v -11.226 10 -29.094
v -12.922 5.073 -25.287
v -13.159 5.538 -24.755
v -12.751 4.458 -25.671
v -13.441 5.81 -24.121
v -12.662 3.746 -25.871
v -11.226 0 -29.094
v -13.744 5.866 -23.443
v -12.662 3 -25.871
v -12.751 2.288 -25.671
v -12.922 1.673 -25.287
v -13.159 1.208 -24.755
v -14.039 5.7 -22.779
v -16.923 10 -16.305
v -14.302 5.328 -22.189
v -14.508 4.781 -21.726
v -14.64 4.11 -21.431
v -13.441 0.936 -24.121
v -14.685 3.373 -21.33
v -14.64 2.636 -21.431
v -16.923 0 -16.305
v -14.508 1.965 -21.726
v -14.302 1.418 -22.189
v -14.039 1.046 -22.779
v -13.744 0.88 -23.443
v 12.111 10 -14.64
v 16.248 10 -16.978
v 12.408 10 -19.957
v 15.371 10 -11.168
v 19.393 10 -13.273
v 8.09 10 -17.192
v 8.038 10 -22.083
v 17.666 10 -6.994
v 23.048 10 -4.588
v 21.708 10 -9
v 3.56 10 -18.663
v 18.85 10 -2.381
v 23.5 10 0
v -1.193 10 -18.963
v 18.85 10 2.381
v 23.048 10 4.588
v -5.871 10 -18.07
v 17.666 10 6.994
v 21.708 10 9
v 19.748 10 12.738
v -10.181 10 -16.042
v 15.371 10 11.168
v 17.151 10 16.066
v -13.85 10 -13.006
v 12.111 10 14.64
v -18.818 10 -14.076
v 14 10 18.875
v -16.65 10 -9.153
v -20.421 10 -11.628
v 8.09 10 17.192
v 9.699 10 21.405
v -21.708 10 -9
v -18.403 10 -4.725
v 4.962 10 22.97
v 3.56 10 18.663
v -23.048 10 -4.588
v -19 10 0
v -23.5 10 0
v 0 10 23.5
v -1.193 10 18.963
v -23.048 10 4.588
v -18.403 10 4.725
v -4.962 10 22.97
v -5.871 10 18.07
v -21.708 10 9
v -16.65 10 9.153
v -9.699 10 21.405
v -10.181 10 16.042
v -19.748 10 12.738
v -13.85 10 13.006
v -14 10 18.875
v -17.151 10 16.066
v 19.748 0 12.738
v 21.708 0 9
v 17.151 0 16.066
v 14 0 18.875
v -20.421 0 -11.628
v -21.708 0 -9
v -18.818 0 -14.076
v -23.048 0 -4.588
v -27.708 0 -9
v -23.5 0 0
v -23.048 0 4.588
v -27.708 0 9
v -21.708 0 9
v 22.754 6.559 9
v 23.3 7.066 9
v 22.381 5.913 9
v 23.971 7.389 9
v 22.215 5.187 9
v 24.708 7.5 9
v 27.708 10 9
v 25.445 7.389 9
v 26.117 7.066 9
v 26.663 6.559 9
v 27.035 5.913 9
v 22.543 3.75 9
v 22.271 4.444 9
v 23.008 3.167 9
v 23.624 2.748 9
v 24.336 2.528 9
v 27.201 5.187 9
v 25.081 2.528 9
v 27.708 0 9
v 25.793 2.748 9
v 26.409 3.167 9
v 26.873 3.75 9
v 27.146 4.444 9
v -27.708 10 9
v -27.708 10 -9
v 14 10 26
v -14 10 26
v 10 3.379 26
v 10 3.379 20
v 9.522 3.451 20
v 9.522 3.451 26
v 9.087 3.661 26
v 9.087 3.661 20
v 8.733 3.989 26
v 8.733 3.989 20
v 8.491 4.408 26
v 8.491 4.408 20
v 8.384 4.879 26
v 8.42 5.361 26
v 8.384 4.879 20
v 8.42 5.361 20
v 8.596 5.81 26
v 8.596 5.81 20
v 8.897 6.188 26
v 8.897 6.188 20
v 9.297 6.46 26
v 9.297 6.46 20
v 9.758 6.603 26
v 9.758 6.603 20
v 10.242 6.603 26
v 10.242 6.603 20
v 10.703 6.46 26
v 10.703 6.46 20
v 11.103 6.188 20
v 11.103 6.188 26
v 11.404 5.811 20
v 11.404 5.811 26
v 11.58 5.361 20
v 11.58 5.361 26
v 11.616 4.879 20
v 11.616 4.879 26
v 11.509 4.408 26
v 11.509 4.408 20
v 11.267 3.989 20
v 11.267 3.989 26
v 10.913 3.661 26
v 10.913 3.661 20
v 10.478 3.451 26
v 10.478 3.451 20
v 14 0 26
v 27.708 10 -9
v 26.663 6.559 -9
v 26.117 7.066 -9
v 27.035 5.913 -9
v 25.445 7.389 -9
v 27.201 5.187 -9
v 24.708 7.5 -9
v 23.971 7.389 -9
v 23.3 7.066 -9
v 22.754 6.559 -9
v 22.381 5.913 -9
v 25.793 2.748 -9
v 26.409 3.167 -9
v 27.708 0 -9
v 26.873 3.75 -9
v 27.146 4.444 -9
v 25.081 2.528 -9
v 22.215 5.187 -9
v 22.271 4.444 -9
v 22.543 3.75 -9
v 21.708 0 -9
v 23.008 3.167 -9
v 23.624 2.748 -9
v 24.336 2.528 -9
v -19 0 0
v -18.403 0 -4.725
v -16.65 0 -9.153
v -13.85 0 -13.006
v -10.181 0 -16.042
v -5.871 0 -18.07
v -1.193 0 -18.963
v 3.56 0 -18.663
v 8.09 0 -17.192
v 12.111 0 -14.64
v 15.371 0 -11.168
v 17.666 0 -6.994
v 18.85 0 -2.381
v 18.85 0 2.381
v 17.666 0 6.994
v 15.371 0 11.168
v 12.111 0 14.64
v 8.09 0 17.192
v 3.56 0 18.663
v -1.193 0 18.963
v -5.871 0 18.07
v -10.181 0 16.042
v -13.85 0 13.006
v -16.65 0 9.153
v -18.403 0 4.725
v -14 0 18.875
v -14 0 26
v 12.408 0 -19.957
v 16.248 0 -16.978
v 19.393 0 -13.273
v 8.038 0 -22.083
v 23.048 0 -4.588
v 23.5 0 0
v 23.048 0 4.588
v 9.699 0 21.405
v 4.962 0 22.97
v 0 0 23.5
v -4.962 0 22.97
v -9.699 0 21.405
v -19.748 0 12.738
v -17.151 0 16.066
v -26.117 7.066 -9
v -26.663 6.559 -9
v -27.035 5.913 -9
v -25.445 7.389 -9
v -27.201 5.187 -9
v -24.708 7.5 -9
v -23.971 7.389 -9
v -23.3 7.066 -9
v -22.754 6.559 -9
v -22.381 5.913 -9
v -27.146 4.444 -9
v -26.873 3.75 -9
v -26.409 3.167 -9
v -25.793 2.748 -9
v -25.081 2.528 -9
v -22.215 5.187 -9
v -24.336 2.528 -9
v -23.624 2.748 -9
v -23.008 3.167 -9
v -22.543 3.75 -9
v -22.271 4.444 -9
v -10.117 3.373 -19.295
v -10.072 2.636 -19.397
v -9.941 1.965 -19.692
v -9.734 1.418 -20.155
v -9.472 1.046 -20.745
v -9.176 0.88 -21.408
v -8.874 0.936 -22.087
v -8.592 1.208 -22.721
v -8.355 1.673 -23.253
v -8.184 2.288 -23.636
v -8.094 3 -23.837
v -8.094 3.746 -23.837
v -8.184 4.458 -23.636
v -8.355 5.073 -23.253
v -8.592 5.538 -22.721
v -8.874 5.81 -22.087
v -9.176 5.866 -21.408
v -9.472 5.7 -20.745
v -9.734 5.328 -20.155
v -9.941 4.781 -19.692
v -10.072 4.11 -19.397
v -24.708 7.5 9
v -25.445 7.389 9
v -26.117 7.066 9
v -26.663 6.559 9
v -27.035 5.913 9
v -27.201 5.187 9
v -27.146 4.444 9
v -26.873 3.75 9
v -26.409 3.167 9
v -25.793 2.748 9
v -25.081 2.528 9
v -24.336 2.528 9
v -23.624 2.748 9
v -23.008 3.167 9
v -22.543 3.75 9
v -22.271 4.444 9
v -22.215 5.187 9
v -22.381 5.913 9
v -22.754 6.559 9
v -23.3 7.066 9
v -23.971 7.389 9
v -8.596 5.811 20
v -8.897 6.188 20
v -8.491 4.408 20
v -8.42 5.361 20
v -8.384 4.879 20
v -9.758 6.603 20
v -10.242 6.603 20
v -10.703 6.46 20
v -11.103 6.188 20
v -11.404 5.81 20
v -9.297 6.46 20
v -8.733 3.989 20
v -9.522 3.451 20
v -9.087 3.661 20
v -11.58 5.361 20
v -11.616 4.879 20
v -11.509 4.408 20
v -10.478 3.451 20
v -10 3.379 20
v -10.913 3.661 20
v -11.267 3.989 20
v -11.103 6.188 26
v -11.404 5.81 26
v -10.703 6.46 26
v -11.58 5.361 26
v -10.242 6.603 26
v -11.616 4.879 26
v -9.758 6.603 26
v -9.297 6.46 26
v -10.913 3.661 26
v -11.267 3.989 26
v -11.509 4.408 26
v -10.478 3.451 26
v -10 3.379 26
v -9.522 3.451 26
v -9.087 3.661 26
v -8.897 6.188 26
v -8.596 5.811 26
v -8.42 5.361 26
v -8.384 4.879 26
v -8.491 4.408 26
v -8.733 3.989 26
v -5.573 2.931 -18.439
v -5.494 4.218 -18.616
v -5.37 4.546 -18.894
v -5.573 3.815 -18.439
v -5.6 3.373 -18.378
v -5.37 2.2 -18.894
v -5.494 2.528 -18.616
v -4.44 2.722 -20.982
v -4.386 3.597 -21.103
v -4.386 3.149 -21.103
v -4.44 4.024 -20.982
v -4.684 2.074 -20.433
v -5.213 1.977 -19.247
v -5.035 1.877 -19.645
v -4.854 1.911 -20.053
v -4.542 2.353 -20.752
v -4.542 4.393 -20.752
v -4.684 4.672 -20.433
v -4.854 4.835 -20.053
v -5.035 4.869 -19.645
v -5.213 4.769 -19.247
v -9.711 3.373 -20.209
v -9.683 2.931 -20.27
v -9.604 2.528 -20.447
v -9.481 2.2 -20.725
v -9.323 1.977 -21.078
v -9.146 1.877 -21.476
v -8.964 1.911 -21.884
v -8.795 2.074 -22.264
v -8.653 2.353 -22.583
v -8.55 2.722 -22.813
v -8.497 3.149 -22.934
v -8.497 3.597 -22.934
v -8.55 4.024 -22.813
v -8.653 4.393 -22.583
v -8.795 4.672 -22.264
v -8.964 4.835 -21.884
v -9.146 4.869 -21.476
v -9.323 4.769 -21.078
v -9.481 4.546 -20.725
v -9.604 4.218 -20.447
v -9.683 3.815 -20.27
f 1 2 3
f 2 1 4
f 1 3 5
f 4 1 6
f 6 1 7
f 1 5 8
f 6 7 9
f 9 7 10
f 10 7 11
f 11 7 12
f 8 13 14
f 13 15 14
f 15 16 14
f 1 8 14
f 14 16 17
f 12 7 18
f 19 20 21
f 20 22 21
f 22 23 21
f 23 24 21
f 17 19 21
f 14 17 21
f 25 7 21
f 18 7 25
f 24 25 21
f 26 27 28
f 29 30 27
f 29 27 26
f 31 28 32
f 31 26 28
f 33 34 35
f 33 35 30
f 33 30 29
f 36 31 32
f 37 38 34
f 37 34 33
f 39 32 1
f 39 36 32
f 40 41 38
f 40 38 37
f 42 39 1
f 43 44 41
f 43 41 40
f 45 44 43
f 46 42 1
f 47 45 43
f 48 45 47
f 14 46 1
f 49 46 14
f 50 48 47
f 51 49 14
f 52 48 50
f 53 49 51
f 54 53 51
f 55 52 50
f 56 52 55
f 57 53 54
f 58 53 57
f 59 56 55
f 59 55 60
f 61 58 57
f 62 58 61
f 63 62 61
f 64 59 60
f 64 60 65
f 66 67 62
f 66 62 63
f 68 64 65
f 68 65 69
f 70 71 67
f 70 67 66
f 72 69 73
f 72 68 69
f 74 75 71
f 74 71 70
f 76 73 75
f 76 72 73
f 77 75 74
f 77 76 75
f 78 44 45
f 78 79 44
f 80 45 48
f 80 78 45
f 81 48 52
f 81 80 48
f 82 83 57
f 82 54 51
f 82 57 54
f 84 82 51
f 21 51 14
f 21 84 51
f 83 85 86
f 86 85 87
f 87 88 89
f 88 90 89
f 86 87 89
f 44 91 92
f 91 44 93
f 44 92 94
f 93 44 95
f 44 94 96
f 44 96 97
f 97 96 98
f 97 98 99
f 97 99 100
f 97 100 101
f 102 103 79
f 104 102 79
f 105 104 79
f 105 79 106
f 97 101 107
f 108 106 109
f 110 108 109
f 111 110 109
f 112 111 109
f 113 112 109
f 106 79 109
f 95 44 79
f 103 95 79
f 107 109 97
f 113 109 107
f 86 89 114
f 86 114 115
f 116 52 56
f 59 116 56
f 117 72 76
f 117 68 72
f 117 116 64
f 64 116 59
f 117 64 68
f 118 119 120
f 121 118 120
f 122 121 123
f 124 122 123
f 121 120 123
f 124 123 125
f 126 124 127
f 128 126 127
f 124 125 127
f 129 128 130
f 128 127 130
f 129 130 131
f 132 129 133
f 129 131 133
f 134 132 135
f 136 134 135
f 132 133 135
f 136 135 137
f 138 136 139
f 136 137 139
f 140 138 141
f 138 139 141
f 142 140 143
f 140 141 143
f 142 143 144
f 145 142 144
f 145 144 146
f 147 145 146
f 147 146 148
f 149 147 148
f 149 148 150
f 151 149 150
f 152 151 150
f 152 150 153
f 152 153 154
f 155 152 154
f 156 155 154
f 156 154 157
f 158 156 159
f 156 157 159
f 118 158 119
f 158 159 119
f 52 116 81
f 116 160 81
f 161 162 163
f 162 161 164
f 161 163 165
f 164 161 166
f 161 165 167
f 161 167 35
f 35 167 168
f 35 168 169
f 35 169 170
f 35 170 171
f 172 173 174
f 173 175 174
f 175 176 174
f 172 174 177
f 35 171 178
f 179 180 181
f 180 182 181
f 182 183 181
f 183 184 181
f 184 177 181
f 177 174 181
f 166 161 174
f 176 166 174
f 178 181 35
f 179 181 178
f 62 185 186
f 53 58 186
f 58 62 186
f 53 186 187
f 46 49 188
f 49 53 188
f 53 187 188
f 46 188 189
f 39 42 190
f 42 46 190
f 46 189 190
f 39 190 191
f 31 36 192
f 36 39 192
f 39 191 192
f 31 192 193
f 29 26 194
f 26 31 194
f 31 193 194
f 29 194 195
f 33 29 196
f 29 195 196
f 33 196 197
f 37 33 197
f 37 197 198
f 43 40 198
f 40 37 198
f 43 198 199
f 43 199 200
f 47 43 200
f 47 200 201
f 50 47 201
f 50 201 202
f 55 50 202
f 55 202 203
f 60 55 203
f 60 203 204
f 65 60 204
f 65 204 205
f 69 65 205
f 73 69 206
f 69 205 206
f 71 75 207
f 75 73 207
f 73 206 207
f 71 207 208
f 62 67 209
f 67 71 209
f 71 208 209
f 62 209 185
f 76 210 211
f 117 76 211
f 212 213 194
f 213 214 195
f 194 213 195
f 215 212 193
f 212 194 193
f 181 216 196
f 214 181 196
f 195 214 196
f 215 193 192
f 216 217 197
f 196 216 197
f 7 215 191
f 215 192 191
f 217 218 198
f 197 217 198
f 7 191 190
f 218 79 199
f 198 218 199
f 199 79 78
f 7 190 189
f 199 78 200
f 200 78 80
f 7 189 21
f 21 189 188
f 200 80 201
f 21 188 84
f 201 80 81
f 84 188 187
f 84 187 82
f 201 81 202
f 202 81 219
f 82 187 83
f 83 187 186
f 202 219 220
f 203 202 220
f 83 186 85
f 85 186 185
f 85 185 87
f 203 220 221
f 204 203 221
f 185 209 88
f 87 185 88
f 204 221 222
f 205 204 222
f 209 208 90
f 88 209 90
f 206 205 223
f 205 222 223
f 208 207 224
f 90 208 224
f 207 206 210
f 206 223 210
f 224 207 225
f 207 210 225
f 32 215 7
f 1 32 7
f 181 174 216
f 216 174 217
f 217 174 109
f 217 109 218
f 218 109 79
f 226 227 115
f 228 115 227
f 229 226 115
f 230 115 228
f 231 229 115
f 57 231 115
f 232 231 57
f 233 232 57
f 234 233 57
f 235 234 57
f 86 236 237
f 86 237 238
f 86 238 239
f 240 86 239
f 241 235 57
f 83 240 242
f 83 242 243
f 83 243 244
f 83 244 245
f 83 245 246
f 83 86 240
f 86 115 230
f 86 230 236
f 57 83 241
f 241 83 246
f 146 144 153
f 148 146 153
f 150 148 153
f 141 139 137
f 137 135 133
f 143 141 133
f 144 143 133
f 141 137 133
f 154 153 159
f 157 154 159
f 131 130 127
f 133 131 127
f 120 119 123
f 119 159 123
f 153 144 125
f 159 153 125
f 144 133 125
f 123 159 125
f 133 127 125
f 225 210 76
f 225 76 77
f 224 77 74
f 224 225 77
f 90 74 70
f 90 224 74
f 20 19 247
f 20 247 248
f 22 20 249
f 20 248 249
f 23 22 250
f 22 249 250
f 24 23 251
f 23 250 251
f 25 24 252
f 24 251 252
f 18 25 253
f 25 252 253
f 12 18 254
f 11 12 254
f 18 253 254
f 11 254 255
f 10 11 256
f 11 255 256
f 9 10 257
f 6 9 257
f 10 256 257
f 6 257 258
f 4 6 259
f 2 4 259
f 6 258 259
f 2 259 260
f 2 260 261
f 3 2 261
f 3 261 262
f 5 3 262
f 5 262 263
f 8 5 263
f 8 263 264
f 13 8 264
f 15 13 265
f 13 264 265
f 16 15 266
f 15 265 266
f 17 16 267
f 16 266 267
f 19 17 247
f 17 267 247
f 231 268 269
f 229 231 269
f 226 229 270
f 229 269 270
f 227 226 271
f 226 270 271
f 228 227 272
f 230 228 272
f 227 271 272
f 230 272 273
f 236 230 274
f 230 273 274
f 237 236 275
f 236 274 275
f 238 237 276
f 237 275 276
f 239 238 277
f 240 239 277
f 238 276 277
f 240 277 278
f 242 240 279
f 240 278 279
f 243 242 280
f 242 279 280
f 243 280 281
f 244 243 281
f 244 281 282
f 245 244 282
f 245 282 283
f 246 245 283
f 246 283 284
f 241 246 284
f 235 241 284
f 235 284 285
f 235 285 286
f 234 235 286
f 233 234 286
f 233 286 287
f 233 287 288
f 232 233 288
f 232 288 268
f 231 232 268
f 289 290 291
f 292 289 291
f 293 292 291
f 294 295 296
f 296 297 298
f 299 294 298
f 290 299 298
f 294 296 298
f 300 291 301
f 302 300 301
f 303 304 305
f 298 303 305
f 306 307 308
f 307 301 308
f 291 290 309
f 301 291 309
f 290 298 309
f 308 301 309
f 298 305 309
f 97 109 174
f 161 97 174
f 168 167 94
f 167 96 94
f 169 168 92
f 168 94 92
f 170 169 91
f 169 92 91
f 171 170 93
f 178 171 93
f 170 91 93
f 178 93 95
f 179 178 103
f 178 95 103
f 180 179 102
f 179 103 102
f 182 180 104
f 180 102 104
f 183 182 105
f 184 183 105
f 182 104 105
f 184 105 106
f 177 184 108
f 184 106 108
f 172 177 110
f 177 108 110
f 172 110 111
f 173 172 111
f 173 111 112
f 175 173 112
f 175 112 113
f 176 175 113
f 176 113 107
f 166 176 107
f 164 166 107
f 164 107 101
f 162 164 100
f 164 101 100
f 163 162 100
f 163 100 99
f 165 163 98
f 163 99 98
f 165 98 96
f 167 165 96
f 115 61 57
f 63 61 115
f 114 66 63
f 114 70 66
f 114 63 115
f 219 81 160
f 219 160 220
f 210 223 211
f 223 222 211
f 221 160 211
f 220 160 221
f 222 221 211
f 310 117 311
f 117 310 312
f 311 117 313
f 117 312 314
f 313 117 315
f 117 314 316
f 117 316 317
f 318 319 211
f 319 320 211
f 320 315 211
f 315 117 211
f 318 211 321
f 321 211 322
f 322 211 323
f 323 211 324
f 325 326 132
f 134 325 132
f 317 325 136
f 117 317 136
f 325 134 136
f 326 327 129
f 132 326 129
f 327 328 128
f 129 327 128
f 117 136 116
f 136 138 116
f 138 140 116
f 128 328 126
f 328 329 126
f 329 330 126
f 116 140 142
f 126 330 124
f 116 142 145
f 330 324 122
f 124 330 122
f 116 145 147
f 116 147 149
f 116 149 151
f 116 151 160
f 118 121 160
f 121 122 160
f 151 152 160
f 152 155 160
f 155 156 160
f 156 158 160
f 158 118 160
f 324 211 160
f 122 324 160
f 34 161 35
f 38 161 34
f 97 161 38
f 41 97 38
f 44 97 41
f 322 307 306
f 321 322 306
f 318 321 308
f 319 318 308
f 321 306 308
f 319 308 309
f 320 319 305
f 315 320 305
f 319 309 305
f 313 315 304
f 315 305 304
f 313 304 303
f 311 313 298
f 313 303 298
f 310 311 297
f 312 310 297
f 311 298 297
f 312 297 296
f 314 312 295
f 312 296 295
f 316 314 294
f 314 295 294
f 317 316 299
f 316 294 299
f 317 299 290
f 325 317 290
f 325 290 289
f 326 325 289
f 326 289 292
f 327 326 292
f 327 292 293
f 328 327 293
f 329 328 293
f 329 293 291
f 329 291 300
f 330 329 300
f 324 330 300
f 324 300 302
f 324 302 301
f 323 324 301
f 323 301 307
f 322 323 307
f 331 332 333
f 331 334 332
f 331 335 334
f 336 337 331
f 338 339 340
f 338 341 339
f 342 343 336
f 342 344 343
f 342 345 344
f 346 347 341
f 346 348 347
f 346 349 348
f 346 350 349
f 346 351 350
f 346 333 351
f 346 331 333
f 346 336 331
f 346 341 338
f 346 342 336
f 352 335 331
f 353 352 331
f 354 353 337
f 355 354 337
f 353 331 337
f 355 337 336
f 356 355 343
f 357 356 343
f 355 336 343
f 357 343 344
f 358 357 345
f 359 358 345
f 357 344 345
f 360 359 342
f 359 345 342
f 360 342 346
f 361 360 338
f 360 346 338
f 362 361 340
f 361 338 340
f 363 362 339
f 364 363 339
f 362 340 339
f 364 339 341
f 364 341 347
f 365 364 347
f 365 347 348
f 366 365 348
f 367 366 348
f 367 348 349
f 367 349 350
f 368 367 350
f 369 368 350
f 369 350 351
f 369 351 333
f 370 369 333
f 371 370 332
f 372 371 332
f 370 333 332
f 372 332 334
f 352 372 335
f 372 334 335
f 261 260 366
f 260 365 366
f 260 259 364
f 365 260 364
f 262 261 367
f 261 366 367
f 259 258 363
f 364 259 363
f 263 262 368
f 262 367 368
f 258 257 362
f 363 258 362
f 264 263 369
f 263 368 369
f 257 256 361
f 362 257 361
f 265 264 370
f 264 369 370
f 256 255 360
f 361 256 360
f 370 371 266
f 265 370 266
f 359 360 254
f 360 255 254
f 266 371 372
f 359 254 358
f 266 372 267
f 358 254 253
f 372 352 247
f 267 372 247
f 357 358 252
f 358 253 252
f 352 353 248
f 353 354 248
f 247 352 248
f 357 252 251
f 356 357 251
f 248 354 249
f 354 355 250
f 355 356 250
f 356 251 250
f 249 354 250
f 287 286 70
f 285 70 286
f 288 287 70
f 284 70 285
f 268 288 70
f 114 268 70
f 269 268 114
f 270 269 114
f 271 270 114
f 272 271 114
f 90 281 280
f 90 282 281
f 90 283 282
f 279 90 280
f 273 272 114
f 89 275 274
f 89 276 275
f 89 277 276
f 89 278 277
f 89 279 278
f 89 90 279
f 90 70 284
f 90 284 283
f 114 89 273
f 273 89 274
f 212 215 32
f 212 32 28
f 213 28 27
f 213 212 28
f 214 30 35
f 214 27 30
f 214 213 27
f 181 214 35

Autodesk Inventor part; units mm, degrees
ref_plane "YZ Plane" through (0, 0, 0) normal (1, 0, 0) x (0, 1, 0)
ref_plane "XZ Plane" through (0, 0, 0) normal (0, 1, 0) x (-1, 0, 0)
sketch "Sketch1" plane through (0, 0, 0) normal (0, 1, 0) x (-1, 0, 0)
  circle A0 centre (0, 0) radius 19
  arc A1 (16.9227, -16.3055) -> (-8.0375, -22.0828) centre (0, 0) ccw
  line L0 (0, 23.5) -> (0, -23.5) construction
  line L1 (23.5, 0) -> (-23.5, 0) construction
  line L2 (-8.0375, -22.0828) -> (11.2262, -29.0942)
  line L3 (11.2262, -29.0942) -> (16.9227, -16.3055)
  line L4 (0, 0) -> (-8.9052, -24.4669) construction
  line L5 (21.7083, 9) -> (27.7083, 9)
  line L6 (27.7083, 9) -> (27.7083, -9)
  line L7 (27.7083, -9) -> (21.7083, -9)
  line L8 (14, 18.8746) -> (14, 26)
  line L9 (14, 26) -> (-14, 26)
  line L10 (-14, 26) -> (-14, 18.8746)
  line L11 (-21.7083, 9) -> (-27.7083, 9)
  line L12 (-27.7083, 9) -> (-27.7083, -9)
  line L13 (-27.7083, -9) -> (-21.7083, -9)
  point P0 (-14, 22.4373)
  dimension "d1" = 47
  dimension "d0" = 20.5
  dimension "d2" = 38
  dimension "d5" = 20
  dimension "d7" = 14
  dimension "d8" = 18
  dimension "d9" = 6
  dimension "d10" = 28
  dimension "d11" = 18
  dimension "d32" = 6
  dimension "d33" = 17
extrude "Extrusion1" add sketch "Sketch1" along normal blind 10
sketch "Sketch2" plane through (-16.9227, 0, -16.3055) normal (-0.9135, 0, -0.4069) x (-0.4069, 0, 0.9135)
  line L0 (-14, 0) -> (-14, 10) projected
  point P0 (8.0089, 0)
  point P1 (-8, 3.373)
  dimension "d24" = 6
hole "Hole1" at (-13.6676, 3.373, -23.6133) direction (0.9135, 0, 0.4069) diameter 3 depth 9.5 counterbore diameter 5 counterbore depth 5
sketch "Sketch3" plane through (-21.7083, 0, -9) normal (0, 0, -1) x (-1, 0, 0)
  line L0 (6, 0) -> (6, 10) projected
  line L1 (0, 0) -> (6, 0) projected
  point P0 (-21.7083, 0)
  point P1 (3, 5)
  point P2 (6, 5)
  point P3 (3, 0)
hole "Hole2" at (-24.7083, 5, -9) direction (0, 0, 1) diameter 5 end through all
sketch "Sketch4" plane through (27.7083, 0, -9) normal (0, 0, -1) x (-1, 0, 0)
  line L0 (0, 0) -> (0, 10) projected
  line L1 (0, 0) -> (6, 0) projected
  point P0 (27.7083, 0)
  point P1 (3, 5)
  point P2 (0, 5)
  point P3 (3, 0)
hole "Hole3" at (24.7083, 5, -9) direction (0, 0, 1) diameter 5 end through all
sketch "Sketch5" plane through (-14, 0, 26) normal (0, 0, 1) x (1, 0, 0)
  line L0 (0, 0) -> (0, 10) projected
  line L1 (28, 0) -> (28, 10) projected
  point P0 (14, 0)
  point P1 (4, 5)
  point P2 (24, 5)
  point P3 (0, 5)
  point P4 (28, 5)
  dimension "d48" = 4
  dimension "d49" = 4
hole "Hole4" at (-10, 5, 26) at (10, 5, 26) direction (0, 0, -1) diameter 3.242 depth 6 thread size "M4x0.7" class "6H" standard "ISO Metric profile"
ref_plane "Work Plane1" through (0, 0, 0) normal (0, 0, 1) x (1, 0, 0)
split_face "Split1"
equation "\"d49\" = d48"
properties part number "2051"
